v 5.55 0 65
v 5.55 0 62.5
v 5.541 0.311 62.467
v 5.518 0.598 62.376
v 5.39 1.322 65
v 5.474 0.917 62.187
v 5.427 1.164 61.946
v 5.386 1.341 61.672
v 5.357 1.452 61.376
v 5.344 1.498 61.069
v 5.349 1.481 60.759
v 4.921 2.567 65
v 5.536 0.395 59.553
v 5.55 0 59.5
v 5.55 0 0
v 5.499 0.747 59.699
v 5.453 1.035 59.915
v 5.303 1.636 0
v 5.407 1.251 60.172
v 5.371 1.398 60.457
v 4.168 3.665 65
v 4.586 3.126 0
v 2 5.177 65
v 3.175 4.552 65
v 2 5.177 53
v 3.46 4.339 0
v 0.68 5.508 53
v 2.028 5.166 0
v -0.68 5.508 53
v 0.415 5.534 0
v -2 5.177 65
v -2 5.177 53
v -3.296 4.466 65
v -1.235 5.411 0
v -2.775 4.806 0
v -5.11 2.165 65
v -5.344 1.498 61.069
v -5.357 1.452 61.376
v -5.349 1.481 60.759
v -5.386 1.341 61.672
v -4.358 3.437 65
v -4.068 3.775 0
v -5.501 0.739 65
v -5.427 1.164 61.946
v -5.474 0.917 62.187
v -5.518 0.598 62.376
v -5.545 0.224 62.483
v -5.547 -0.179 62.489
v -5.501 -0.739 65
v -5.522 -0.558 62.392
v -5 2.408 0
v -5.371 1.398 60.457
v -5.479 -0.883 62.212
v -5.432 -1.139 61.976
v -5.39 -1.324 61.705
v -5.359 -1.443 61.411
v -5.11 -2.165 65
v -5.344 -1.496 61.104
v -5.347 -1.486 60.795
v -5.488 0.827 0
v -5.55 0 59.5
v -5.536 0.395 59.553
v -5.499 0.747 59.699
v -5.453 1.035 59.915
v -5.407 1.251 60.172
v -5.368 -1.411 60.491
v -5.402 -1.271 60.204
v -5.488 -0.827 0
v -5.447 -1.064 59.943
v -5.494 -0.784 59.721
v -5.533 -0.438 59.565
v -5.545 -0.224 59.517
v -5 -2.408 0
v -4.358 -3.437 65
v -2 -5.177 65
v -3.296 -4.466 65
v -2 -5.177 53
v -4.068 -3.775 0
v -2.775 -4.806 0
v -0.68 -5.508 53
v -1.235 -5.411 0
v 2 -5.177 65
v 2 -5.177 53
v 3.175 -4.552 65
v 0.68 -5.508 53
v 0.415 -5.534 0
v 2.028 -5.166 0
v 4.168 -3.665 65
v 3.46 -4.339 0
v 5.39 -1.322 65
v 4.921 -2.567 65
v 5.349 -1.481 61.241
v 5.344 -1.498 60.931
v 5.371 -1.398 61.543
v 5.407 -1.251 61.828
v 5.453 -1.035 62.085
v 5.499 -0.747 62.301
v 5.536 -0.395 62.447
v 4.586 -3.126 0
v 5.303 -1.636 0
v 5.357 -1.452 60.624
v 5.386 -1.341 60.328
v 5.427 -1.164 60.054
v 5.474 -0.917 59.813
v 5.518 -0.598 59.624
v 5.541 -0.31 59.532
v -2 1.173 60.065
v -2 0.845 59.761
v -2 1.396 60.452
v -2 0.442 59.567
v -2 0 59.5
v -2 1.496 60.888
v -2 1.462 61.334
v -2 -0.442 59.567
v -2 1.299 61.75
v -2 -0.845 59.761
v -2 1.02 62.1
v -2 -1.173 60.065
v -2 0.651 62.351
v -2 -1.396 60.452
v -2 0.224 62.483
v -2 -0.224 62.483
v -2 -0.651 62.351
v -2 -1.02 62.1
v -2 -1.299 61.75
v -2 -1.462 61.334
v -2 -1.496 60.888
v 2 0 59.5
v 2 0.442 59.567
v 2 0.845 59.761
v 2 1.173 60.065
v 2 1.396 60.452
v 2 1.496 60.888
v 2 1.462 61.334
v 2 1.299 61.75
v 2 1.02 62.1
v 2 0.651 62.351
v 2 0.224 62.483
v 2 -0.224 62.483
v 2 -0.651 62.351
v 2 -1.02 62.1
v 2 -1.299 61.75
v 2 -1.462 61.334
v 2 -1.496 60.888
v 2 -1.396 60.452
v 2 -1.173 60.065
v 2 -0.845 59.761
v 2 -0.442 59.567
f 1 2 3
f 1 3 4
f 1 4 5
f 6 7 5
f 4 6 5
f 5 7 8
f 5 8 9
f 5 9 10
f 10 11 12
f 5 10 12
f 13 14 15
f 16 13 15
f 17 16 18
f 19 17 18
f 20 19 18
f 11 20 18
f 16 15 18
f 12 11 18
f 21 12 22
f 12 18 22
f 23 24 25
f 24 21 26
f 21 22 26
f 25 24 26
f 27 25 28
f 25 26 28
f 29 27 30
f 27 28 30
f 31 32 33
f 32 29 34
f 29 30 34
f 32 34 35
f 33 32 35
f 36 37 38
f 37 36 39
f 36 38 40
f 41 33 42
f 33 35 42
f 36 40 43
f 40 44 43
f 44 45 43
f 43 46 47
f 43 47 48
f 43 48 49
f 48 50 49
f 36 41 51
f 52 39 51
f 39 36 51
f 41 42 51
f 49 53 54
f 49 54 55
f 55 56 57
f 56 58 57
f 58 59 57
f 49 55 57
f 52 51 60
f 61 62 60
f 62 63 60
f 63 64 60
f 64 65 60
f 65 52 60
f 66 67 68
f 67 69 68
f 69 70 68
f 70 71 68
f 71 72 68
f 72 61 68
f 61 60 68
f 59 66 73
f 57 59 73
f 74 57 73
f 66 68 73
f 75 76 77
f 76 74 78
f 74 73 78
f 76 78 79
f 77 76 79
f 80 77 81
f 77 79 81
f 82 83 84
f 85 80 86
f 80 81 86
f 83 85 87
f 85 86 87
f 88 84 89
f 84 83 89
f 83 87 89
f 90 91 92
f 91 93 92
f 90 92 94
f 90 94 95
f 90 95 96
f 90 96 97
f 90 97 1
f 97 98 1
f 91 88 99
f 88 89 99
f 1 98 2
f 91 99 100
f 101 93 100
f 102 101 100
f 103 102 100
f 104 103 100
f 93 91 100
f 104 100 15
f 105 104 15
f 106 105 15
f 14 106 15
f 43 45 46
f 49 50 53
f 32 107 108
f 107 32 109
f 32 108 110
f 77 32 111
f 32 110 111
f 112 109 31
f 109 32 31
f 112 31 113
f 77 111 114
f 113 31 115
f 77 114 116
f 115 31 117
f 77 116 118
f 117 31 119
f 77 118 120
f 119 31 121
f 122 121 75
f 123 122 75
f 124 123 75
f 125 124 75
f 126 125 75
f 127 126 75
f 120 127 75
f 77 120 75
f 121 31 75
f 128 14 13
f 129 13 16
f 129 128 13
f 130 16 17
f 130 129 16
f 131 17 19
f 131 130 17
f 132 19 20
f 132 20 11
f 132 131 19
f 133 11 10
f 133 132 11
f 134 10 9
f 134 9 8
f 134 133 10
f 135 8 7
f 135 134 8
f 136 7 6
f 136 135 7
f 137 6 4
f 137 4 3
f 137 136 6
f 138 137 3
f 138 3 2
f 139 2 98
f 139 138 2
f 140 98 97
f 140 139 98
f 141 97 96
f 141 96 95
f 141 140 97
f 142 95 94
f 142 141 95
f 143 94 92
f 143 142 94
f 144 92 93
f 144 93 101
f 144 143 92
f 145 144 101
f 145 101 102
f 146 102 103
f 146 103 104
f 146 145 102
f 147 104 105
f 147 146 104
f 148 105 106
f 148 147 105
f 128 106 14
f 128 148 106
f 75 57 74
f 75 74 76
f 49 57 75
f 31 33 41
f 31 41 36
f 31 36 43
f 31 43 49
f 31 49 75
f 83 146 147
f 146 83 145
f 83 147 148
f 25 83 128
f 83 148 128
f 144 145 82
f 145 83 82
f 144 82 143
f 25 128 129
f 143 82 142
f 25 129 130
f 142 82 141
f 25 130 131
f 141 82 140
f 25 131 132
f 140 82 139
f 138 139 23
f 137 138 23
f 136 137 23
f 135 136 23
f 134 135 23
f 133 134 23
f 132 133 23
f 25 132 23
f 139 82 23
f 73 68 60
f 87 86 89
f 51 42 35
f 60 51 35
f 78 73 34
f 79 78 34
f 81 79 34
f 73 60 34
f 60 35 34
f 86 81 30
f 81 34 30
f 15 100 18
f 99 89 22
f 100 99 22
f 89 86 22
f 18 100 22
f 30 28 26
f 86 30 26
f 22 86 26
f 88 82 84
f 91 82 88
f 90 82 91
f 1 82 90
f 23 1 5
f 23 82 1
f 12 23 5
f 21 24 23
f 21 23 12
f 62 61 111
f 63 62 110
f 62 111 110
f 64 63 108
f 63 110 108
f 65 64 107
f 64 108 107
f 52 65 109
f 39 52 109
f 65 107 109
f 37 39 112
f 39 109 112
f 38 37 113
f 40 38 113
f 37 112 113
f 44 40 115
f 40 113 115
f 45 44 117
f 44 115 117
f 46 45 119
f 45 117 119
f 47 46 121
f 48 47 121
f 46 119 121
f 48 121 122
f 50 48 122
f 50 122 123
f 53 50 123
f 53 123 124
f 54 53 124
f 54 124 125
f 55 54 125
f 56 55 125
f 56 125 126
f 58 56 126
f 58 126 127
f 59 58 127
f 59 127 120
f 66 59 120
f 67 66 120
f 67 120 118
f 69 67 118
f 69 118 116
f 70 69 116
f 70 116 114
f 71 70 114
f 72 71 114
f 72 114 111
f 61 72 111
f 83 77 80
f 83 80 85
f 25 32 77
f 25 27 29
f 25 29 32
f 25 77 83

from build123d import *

# Parameters (mm, degrees)
ESQUISSE1_R                  = 5.55
BOSS_EXTRU_1_DEPTH           = 65
ENL_V_MAT_EXTRU_1_DEPTH      = 12
ESQUISSE3_R                  = 1.5
ENL_V_MAT_EXTRU_2_DEPTH      = 6.55
ENL_V_MAT_EXTRU_2_DEPTH_BACK = 6.55


with BuildPart() as part:
    # Esquisse1 → Boss.-Extru.1 (new body)
    with BuildSketch(Plane.XY):
        Circle(ESQUISSE1_R)
    extrude(amount=BOSS_EXTRU_1_DEPTH)

    # Esquisse2 → Enlèv. mat.-Extru.1 (cut)
    with BuildSketch(Plane.XY.offset(65)):
        with BuildLine():
            Line((-2, 5.177113095), (-2, -5.177113095))
            ThreePointArc((-2, -5.177113095), (0, -5.55), (2, -5.177113095))
            Line((2, -5.177113095), (2, 5.177113095))
            ThreePointArc((2, 5.177113095), (0, 5.55), (-2, 5.177113095))
        make_face()
    extrude(amount=-ENL_V_MAT_EXTRU_1_DEPTH, mode=Mode.SUBTRACT)

    # Esquisse3 → Enlèv. mat.-Extru.2 (cut, two sides)
    with BuildSketch(Plane(origin=(0, 0, 0), x_dir=(0, 0, -1), z_dir=(1, 0, 0))) as enl_v_mat_extru_2_sk:
        with Locations((-61, 0)):
            Circle(ESQUISSE3_R)
    extrude(amount=ENL_V_MAT_EXTRU_2_DEPTH, mode=Mode.SUBTRACT)
    extrude(enl_v_mat_extru_2_sk.sketch, amount=-ENL_V_MAT_EXTRU_2_DEPTH_BACK, mode=Mode.SUBTRACT)


solid = part.part
